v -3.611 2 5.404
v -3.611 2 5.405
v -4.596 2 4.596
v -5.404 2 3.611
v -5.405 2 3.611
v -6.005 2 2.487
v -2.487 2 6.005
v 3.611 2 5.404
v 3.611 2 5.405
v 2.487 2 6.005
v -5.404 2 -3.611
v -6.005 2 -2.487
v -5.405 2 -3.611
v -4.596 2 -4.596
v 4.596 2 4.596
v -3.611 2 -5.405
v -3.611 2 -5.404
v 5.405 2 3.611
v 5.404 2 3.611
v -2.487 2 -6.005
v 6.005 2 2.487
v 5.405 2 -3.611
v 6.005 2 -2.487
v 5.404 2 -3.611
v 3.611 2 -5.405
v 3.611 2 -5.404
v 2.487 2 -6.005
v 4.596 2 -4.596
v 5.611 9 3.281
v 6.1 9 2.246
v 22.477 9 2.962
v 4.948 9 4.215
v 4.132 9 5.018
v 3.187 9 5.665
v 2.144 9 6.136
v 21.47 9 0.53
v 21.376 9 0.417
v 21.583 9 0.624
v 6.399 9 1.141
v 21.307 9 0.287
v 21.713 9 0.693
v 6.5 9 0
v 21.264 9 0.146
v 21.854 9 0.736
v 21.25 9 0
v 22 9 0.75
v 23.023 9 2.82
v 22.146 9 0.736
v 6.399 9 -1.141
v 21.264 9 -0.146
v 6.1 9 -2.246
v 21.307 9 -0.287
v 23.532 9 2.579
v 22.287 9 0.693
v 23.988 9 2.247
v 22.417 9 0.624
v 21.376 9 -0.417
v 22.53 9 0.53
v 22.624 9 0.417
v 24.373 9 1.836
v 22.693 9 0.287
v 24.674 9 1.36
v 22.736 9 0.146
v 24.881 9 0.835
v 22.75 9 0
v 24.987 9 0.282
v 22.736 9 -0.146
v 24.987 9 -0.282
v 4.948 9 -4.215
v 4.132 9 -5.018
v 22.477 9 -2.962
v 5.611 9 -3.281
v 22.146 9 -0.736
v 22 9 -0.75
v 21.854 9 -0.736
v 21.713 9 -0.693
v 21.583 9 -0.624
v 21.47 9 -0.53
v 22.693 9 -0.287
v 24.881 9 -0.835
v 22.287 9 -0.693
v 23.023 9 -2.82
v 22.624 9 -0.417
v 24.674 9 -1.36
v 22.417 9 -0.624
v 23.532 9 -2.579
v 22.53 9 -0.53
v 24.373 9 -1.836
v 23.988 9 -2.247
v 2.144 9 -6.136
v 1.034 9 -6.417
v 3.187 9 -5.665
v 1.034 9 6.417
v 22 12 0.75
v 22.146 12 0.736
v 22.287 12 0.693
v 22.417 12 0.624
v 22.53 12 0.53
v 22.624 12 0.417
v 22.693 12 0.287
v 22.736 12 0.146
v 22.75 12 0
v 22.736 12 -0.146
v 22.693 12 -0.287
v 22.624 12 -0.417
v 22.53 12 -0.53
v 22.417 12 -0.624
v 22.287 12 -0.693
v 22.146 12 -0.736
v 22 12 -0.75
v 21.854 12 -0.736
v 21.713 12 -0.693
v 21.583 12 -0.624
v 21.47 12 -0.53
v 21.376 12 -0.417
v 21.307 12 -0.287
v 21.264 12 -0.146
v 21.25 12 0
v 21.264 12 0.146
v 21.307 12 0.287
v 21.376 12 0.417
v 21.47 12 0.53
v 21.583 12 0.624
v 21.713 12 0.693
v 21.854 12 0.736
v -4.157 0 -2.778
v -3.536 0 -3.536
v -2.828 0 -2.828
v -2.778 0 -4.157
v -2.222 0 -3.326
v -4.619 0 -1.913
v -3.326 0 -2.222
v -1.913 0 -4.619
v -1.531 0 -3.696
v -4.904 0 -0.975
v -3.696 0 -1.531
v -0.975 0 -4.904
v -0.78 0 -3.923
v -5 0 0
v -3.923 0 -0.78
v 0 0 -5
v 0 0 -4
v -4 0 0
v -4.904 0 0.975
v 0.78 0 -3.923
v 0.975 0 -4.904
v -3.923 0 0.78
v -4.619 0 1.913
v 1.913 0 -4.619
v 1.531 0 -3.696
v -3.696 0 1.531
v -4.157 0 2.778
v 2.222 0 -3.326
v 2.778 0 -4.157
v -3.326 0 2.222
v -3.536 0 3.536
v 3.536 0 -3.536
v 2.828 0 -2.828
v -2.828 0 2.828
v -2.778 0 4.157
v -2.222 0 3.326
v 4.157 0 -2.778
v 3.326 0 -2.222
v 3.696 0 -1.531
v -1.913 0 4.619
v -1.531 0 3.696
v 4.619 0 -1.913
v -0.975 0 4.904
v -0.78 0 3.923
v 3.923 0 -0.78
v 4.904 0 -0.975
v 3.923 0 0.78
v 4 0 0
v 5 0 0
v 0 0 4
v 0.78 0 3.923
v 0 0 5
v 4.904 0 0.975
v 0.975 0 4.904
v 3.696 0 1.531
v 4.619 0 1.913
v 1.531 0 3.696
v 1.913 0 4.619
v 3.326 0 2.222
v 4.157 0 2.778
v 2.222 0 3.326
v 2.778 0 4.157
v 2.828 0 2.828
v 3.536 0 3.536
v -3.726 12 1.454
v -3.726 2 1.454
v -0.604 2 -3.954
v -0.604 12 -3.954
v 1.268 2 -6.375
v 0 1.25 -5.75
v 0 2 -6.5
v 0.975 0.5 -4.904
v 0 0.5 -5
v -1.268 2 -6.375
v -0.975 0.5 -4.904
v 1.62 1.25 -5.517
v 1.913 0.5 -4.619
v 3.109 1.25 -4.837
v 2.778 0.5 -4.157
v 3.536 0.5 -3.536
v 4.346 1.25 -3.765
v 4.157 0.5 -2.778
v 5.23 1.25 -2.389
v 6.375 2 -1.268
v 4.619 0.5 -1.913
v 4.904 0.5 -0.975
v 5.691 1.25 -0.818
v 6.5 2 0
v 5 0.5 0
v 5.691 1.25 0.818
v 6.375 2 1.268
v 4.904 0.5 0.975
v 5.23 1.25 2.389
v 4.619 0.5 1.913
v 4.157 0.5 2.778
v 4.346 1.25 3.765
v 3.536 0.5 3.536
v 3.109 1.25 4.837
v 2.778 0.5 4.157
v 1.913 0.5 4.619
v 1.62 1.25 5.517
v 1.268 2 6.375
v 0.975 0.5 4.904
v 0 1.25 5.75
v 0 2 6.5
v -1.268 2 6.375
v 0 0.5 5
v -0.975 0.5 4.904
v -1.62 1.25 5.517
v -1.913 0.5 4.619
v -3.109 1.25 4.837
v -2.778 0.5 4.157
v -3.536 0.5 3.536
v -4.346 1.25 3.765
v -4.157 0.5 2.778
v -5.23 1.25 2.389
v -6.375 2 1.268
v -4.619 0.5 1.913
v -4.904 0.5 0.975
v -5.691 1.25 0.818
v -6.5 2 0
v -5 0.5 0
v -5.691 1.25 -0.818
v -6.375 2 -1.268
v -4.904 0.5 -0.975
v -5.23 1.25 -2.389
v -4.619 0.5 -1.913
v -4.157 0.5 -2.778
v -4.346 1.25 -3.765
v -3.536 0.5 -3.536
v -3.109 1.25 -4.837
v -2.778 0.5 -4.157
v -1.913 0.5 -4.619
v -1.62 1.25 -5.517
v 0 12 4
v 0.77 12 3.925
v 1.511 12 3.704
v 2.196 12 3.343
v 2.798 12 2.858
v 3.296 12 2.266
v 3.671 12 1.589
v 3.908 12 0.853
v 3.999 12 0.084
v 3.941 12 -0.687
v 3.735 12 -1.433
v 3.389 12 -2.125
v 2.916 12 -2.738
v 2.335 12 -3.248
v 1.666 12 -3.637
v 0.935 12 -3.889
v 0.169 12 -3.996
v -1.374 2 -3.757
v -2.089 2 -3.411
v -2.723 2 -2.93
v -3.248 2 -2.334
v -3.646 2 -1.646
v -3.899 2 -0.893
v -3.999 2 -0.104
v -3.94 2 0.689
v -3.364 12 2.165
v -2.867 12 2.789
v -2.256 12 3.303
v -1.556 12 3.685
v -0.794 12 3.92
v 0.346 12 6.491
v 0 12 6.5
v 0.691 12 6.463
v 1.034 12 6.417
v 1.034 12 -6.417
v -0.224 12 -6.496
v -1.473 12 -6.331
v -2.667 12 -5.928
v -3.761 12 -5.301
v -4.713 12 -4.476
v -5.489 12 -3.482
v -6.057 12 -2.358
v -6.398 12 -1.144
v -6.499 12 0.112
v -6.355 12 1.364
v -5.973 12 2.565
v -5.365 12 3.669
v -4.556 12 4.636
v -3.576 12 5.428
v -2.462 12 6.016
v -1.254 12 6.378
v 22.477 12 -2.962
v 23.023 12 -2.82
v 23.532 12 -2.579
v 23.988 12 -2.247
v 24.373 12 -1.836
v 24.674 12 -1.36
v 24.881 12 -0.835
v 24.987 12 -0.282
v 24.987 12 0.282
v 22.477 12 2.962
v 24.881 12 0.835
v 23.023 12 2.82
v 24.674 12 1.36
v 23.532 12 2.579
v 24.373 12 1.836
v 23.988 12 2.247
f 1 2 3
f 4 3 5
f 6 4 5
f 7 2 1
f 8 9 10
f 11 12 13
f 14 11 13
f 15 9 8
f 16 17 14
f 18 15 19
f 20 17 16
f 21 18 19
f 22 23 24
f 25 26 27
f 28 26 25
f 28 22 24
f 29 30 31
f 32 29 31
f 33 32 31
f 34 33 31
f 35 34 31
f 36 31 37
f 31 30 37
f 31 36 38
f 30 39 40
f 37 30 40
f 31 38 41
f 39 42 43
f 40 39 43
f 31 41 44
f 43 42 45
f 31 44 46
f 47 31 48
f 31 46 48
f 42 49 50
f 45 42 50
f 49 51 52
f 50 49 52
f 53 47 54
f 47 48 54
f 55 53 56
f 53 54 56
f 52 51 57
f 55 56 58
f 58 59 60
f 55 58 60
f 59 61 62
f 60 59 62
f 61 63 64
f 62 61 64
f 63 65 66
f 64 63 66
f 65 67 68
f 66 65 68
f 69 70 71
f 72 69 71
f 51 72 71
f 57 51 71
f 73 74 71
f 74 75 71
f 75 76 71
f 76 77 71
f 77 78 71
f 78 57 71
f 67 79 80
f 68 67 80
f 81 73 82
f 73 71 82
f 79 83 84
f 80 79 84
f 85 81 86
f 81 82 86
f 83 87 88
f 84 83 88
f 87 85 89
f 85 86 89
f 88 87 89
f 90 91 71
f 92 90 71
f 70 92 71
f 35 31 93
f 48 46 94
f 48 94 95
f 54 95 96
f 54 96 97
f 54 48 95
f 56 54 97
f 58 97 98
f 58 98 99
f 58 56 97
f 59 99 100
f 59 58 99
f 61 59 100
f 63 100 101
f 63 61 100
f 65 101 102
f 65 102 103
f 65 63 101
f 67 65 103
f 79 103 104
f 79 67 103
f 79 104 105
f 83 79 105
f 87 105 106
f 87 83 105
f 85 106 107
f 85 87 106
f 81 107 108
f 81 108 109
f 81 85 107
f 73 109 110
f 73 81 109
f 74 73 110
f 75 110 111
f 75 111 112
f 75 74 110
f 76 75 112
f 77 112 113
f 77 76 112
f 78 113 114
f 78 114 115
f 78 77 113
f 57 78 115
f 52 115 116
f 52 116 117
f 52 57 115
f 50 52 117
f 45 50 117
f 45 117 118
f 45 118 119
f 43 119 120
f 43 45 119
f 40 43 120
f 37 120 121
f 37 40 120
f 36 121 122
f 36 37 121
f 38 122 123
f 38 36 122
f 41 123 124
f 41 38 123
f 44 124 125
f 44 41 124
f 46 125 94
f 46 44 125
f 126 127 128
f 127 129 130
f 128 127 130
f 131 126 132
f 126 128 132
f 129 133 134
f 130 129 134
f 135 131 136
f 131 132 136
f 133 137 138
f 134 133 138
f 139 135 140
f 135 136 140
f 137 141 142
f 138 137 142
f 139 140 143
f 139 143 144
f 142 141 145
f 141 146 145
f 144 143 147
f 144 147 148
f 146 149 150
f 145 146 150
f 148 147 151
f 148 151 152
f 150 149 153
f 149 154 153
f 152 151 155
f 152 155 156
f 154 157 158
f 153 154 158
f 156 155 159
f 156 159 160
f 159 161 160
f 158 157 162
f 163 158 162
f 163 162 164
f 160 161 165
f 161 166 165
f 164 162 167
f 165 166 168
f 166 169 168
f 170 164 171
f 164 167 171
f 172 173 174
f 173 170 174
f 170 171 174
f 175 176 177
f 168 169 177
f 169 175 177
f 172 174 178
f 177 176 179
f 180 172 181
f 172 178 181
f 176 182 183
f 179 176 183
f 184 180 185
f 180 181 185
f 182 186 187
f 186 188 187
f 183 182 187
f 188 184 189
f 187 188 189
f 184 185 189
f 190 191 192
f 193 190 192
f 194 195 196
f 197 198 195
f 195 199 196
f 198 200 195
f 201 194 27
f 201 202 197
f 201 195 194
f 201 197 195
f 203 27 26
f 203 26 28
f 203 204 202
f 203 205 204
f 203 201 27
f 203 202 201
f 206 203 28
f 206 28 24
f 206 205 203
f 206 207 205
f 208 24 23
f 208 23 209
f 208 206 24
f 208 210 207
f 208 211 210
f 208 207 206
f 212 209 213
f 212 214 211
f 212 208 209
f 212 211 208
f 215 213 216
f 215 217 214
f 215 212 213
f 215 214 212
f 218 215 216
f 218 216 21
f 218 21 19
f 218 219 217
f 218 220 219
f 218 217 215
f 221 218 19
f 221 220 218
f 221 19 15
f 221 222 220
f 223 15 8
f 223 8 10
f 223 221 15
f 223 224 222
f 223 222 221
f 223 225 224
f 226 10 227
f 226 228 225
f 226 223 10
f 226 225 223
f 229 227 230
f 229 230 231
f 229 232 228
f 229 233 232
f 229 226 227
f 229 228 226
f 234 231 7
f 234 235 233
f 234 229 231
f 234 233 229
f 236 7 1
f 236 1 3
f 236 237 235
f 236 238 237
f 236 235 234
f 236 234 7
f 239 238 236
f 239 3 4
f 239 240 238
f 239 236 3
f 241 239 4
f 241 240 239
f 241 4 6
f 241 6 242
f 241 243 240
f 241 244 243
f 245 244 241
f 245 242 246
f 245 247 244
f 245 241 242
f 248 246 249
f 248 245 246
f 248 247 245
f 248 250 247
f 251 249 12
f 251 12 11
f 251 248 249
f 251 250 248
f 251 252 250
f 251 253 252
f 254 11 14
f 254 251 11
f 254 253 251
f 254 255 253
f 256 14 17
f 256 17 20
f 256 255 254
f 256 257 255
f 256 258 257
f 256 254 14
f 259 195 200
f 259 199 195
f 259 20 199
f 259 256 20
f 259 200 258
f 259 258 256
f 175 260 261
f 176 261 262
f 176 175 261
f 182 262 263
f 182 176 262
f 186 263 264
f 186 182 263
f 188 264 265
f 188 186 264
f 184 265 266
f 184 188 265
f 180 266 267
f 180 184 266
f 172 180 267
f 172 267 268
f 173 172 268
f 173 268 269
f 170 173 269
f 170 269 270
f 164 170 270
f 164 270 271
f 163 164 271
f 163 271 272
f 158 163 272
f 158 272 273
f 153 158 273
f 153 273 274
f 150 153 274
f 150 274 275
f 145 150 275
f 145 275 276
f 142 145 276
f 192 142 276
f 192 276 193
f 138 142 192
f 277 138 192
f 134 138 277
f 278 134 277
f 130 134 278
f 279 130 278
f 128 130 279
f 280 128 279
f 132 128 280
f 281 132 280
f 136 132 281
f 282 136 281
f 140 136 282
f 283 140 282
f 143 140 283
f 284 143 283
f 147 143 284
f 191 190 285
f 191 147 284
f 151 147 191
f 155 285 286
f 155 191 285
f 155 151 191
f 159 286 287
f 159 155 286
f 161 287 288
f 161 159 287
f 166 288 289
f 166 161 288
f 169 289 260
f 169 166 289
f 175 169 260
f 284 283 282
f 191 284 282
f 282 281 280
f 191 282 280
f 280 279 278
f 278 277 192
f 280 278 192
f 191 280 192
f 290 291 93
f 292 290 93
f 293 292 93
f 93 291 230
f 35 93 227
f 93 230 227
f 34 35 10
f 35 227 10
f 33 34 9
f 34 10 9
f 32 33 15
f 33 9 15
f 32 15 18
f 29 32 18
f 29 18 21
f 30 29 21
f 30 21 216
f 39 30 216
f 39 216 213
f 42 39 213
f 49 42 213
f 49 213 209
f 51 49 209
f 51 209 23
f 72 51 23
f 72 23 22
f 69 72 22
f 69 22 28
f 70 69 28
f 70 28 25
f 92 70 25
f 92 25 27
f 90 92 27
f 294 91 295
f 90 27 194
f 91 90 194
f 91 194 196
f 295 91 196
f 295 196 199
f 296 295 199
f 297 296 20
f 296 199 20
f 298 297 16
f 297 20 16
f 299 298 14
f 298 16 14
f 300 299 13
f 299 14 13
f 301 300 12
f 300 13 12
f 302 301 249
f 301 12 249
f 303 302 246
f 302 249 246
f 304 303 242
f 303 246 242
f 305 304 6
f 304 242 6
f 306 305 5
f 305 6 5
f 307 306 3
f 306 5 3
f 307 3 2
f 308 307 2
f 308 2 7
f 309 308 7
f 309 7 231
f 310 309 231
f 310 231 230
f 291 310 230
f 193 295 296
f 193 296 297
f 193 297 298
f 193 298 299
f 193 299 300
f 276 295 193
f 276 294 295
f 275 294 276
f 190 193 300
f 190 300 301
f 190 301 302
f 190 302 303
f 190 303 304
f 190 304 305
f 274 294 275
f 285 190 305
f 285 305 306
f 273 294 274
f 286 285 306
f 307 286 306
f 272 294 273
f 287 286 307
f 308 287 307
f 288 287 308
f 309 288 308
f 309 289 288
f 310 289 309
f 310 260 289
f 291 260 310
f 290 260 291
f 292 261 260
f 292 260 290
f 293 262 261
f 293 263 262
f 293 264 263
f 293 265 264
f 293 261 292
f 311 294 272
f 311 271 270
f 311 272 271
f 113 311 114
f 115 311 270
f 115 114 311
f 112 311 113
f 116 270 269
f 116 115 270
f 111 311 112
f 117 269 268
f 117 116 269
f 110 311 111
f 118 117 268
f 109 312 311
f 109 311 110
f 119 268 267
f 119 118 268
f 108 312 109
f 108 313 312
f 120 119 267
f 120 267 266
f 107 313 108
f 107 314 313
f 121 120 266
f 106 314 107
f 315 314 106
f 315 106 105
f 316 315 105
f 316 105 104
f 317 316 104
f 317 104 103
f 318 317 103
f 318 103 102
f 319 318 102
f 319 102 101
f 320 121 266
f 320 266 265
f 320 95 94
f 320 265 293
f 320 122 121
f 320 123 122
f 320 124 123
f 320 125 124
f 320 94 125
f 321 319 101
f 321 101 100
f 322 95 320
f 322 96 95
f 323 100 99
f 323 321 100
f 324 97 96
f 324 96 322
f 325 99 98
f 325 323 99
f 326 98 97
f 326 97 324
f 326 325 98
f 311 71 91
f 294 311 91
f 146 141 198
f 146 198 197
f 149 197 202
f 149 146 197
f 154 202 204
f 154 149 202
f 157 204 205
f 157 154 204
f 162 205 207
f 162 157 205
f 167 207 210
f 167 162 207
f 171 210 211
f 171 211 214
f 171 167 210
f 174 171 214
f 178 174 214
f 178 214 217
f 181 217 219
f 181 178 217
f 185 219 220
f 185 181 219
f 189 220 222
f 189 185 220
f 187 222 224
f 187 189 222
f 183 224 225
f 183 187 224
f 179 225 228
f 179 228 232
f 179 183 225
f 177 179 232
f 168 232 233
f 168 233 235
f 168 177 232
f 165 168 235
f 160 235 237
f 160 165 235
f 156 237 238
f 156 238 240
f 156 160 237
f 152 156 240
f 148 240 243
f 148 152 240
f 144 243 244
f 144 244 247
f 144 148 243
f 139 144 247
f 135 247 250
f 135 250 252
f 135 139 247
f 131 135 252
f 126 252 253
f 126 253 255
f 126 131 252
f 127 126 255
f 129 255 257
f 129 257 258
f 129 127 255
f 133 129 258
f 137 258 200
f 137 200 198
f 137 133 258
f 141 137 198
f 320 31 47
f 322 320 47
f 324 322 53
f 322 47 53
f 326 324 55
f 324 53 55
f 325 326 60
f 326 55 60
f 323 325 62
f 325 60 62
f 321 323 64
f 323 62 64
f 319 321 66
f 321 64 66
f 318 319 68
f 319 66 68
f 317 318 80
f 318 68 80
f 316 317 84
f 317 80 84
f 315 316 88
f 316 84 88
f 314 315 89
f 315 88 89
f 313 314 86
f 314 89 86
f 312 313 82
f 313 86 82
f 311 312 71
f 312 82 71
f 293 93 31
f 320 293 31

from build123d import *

# Parameters (mm, degrees)
SKETCH1_R           = 6.5
SKETCH1_R_2         = 4
BOSS_EXTRUDE1_DEPTH = 12
BOSS_EXTRUDE2_START = -3
SKETCH2_R           = 0.75
BOSS_EXTRUDE2_DEPTH = 3
SKETCH4_R           = 6.5
SKETCH4_R_2         = 5
CUT_EXTRUDE1_DEPTH  = 2
BOSS_EXTRUDE4_START = -10
BOSS_EXTRUDE4_DEPTH = 10
CHAMFER1_SIZE       = 1.5


with BuildPart() as part:
    # Sketch1 → Boss-Extrude1 (new body)
    with BuildSketch(Plane(origin=(0, 0, 0), x_dir=(1, 0, 0), z_dir=(0, 1, 0))):
        with Locations(Location((0, 0, 0), (0, 0, 270))):
            Circle(SKETCH1_R)
        with Locations(Location((0, 0, 0), (0, 0, 270))):
            Circle(SKETCH1_R_2, mode=Mode.SUBTRACT)
    extrude(amount=BOSS_EXTRUDE1_DEPTH)

    # Sketch2 → Boss-Extrude2 (add)
    with BuildSketch(Plane(origin=(0, 12, 0), x_dir=(1, 0, 0), z_dir=(0, 1, 0)).offset(BOSS_EXTRUDE2_START)):
        with BuildLine():
            Line((22.477272727, 2.961791813), (1.034090909, 6.417215595))
            ThreePointArc((1.034090909, 6.417215595), (4.948312384, 4.214760319), (6.5, 0))
            ThreePointArc((6.5, 0), (4.948312384, -4.214760319), (1.034090909, -6.417215595))
            Line((1.034090909, -6.417215595), (22.477272727, -2.961791813))
            ThreePointArc((22.477272727, -2.961791813), (25, 0), (22.477272727, 2.961791813))
        make_face()
        with Locations(Location((22, 0, 0), (0, 0, 270))):
            Circle(SKETCH2_R, mode=Mode.SUBTRACT)
    extrude(amount=BOSS_EXTRUDE2_DEPTH)

    # Sketch4 → Cut-Extrude1 (cut)
    with BuildSketch(Plane.XZ):
        with Locations(Location((0, 0, 0), (0, 0, 270))):
            Circle(SKETCH4_R)
        with Locations(Location((0, 0, 0), (0, 0, 270))):
            Circle(SKETCH4_R_2, mode=Mode.SUBTRACT)
    extrude(amount=-CUT_EXTRUDE1_DEPTH, mode=Mode.SUBTRACT)

    # Sketch5 → Boss-Extrude4 (add)
    with BuildSketch(Plane(origin=(0, 12, 0), x_dir=(1, 0, 0), z_dir=(0, 1, 0)).offset(BOSS_EXTRUDE4_START)):
        with BuildLine():
            Line((-3.726313009, -1.454163457), (-0.60381401, 3.954163457))
            ThreePointArc((-0.60381401, 3.954163457), (-3.464101615, 2), (-3.726313009, -1.454163457))
        make_face()
    extrude(amount=BOSS_EXTRUDE4_DEPTH)

    # Chamfer1
    chamfer1_edges = [part.edges().sort_by_distance(p)[0] for p in [
        (0, 2, 5),
    ]]
    chamfer(chamfer1_edges, length=CHAMFER1_SIZE - 0.0001)  # a hair under: the kernel refuses the full size


solid = part.part
